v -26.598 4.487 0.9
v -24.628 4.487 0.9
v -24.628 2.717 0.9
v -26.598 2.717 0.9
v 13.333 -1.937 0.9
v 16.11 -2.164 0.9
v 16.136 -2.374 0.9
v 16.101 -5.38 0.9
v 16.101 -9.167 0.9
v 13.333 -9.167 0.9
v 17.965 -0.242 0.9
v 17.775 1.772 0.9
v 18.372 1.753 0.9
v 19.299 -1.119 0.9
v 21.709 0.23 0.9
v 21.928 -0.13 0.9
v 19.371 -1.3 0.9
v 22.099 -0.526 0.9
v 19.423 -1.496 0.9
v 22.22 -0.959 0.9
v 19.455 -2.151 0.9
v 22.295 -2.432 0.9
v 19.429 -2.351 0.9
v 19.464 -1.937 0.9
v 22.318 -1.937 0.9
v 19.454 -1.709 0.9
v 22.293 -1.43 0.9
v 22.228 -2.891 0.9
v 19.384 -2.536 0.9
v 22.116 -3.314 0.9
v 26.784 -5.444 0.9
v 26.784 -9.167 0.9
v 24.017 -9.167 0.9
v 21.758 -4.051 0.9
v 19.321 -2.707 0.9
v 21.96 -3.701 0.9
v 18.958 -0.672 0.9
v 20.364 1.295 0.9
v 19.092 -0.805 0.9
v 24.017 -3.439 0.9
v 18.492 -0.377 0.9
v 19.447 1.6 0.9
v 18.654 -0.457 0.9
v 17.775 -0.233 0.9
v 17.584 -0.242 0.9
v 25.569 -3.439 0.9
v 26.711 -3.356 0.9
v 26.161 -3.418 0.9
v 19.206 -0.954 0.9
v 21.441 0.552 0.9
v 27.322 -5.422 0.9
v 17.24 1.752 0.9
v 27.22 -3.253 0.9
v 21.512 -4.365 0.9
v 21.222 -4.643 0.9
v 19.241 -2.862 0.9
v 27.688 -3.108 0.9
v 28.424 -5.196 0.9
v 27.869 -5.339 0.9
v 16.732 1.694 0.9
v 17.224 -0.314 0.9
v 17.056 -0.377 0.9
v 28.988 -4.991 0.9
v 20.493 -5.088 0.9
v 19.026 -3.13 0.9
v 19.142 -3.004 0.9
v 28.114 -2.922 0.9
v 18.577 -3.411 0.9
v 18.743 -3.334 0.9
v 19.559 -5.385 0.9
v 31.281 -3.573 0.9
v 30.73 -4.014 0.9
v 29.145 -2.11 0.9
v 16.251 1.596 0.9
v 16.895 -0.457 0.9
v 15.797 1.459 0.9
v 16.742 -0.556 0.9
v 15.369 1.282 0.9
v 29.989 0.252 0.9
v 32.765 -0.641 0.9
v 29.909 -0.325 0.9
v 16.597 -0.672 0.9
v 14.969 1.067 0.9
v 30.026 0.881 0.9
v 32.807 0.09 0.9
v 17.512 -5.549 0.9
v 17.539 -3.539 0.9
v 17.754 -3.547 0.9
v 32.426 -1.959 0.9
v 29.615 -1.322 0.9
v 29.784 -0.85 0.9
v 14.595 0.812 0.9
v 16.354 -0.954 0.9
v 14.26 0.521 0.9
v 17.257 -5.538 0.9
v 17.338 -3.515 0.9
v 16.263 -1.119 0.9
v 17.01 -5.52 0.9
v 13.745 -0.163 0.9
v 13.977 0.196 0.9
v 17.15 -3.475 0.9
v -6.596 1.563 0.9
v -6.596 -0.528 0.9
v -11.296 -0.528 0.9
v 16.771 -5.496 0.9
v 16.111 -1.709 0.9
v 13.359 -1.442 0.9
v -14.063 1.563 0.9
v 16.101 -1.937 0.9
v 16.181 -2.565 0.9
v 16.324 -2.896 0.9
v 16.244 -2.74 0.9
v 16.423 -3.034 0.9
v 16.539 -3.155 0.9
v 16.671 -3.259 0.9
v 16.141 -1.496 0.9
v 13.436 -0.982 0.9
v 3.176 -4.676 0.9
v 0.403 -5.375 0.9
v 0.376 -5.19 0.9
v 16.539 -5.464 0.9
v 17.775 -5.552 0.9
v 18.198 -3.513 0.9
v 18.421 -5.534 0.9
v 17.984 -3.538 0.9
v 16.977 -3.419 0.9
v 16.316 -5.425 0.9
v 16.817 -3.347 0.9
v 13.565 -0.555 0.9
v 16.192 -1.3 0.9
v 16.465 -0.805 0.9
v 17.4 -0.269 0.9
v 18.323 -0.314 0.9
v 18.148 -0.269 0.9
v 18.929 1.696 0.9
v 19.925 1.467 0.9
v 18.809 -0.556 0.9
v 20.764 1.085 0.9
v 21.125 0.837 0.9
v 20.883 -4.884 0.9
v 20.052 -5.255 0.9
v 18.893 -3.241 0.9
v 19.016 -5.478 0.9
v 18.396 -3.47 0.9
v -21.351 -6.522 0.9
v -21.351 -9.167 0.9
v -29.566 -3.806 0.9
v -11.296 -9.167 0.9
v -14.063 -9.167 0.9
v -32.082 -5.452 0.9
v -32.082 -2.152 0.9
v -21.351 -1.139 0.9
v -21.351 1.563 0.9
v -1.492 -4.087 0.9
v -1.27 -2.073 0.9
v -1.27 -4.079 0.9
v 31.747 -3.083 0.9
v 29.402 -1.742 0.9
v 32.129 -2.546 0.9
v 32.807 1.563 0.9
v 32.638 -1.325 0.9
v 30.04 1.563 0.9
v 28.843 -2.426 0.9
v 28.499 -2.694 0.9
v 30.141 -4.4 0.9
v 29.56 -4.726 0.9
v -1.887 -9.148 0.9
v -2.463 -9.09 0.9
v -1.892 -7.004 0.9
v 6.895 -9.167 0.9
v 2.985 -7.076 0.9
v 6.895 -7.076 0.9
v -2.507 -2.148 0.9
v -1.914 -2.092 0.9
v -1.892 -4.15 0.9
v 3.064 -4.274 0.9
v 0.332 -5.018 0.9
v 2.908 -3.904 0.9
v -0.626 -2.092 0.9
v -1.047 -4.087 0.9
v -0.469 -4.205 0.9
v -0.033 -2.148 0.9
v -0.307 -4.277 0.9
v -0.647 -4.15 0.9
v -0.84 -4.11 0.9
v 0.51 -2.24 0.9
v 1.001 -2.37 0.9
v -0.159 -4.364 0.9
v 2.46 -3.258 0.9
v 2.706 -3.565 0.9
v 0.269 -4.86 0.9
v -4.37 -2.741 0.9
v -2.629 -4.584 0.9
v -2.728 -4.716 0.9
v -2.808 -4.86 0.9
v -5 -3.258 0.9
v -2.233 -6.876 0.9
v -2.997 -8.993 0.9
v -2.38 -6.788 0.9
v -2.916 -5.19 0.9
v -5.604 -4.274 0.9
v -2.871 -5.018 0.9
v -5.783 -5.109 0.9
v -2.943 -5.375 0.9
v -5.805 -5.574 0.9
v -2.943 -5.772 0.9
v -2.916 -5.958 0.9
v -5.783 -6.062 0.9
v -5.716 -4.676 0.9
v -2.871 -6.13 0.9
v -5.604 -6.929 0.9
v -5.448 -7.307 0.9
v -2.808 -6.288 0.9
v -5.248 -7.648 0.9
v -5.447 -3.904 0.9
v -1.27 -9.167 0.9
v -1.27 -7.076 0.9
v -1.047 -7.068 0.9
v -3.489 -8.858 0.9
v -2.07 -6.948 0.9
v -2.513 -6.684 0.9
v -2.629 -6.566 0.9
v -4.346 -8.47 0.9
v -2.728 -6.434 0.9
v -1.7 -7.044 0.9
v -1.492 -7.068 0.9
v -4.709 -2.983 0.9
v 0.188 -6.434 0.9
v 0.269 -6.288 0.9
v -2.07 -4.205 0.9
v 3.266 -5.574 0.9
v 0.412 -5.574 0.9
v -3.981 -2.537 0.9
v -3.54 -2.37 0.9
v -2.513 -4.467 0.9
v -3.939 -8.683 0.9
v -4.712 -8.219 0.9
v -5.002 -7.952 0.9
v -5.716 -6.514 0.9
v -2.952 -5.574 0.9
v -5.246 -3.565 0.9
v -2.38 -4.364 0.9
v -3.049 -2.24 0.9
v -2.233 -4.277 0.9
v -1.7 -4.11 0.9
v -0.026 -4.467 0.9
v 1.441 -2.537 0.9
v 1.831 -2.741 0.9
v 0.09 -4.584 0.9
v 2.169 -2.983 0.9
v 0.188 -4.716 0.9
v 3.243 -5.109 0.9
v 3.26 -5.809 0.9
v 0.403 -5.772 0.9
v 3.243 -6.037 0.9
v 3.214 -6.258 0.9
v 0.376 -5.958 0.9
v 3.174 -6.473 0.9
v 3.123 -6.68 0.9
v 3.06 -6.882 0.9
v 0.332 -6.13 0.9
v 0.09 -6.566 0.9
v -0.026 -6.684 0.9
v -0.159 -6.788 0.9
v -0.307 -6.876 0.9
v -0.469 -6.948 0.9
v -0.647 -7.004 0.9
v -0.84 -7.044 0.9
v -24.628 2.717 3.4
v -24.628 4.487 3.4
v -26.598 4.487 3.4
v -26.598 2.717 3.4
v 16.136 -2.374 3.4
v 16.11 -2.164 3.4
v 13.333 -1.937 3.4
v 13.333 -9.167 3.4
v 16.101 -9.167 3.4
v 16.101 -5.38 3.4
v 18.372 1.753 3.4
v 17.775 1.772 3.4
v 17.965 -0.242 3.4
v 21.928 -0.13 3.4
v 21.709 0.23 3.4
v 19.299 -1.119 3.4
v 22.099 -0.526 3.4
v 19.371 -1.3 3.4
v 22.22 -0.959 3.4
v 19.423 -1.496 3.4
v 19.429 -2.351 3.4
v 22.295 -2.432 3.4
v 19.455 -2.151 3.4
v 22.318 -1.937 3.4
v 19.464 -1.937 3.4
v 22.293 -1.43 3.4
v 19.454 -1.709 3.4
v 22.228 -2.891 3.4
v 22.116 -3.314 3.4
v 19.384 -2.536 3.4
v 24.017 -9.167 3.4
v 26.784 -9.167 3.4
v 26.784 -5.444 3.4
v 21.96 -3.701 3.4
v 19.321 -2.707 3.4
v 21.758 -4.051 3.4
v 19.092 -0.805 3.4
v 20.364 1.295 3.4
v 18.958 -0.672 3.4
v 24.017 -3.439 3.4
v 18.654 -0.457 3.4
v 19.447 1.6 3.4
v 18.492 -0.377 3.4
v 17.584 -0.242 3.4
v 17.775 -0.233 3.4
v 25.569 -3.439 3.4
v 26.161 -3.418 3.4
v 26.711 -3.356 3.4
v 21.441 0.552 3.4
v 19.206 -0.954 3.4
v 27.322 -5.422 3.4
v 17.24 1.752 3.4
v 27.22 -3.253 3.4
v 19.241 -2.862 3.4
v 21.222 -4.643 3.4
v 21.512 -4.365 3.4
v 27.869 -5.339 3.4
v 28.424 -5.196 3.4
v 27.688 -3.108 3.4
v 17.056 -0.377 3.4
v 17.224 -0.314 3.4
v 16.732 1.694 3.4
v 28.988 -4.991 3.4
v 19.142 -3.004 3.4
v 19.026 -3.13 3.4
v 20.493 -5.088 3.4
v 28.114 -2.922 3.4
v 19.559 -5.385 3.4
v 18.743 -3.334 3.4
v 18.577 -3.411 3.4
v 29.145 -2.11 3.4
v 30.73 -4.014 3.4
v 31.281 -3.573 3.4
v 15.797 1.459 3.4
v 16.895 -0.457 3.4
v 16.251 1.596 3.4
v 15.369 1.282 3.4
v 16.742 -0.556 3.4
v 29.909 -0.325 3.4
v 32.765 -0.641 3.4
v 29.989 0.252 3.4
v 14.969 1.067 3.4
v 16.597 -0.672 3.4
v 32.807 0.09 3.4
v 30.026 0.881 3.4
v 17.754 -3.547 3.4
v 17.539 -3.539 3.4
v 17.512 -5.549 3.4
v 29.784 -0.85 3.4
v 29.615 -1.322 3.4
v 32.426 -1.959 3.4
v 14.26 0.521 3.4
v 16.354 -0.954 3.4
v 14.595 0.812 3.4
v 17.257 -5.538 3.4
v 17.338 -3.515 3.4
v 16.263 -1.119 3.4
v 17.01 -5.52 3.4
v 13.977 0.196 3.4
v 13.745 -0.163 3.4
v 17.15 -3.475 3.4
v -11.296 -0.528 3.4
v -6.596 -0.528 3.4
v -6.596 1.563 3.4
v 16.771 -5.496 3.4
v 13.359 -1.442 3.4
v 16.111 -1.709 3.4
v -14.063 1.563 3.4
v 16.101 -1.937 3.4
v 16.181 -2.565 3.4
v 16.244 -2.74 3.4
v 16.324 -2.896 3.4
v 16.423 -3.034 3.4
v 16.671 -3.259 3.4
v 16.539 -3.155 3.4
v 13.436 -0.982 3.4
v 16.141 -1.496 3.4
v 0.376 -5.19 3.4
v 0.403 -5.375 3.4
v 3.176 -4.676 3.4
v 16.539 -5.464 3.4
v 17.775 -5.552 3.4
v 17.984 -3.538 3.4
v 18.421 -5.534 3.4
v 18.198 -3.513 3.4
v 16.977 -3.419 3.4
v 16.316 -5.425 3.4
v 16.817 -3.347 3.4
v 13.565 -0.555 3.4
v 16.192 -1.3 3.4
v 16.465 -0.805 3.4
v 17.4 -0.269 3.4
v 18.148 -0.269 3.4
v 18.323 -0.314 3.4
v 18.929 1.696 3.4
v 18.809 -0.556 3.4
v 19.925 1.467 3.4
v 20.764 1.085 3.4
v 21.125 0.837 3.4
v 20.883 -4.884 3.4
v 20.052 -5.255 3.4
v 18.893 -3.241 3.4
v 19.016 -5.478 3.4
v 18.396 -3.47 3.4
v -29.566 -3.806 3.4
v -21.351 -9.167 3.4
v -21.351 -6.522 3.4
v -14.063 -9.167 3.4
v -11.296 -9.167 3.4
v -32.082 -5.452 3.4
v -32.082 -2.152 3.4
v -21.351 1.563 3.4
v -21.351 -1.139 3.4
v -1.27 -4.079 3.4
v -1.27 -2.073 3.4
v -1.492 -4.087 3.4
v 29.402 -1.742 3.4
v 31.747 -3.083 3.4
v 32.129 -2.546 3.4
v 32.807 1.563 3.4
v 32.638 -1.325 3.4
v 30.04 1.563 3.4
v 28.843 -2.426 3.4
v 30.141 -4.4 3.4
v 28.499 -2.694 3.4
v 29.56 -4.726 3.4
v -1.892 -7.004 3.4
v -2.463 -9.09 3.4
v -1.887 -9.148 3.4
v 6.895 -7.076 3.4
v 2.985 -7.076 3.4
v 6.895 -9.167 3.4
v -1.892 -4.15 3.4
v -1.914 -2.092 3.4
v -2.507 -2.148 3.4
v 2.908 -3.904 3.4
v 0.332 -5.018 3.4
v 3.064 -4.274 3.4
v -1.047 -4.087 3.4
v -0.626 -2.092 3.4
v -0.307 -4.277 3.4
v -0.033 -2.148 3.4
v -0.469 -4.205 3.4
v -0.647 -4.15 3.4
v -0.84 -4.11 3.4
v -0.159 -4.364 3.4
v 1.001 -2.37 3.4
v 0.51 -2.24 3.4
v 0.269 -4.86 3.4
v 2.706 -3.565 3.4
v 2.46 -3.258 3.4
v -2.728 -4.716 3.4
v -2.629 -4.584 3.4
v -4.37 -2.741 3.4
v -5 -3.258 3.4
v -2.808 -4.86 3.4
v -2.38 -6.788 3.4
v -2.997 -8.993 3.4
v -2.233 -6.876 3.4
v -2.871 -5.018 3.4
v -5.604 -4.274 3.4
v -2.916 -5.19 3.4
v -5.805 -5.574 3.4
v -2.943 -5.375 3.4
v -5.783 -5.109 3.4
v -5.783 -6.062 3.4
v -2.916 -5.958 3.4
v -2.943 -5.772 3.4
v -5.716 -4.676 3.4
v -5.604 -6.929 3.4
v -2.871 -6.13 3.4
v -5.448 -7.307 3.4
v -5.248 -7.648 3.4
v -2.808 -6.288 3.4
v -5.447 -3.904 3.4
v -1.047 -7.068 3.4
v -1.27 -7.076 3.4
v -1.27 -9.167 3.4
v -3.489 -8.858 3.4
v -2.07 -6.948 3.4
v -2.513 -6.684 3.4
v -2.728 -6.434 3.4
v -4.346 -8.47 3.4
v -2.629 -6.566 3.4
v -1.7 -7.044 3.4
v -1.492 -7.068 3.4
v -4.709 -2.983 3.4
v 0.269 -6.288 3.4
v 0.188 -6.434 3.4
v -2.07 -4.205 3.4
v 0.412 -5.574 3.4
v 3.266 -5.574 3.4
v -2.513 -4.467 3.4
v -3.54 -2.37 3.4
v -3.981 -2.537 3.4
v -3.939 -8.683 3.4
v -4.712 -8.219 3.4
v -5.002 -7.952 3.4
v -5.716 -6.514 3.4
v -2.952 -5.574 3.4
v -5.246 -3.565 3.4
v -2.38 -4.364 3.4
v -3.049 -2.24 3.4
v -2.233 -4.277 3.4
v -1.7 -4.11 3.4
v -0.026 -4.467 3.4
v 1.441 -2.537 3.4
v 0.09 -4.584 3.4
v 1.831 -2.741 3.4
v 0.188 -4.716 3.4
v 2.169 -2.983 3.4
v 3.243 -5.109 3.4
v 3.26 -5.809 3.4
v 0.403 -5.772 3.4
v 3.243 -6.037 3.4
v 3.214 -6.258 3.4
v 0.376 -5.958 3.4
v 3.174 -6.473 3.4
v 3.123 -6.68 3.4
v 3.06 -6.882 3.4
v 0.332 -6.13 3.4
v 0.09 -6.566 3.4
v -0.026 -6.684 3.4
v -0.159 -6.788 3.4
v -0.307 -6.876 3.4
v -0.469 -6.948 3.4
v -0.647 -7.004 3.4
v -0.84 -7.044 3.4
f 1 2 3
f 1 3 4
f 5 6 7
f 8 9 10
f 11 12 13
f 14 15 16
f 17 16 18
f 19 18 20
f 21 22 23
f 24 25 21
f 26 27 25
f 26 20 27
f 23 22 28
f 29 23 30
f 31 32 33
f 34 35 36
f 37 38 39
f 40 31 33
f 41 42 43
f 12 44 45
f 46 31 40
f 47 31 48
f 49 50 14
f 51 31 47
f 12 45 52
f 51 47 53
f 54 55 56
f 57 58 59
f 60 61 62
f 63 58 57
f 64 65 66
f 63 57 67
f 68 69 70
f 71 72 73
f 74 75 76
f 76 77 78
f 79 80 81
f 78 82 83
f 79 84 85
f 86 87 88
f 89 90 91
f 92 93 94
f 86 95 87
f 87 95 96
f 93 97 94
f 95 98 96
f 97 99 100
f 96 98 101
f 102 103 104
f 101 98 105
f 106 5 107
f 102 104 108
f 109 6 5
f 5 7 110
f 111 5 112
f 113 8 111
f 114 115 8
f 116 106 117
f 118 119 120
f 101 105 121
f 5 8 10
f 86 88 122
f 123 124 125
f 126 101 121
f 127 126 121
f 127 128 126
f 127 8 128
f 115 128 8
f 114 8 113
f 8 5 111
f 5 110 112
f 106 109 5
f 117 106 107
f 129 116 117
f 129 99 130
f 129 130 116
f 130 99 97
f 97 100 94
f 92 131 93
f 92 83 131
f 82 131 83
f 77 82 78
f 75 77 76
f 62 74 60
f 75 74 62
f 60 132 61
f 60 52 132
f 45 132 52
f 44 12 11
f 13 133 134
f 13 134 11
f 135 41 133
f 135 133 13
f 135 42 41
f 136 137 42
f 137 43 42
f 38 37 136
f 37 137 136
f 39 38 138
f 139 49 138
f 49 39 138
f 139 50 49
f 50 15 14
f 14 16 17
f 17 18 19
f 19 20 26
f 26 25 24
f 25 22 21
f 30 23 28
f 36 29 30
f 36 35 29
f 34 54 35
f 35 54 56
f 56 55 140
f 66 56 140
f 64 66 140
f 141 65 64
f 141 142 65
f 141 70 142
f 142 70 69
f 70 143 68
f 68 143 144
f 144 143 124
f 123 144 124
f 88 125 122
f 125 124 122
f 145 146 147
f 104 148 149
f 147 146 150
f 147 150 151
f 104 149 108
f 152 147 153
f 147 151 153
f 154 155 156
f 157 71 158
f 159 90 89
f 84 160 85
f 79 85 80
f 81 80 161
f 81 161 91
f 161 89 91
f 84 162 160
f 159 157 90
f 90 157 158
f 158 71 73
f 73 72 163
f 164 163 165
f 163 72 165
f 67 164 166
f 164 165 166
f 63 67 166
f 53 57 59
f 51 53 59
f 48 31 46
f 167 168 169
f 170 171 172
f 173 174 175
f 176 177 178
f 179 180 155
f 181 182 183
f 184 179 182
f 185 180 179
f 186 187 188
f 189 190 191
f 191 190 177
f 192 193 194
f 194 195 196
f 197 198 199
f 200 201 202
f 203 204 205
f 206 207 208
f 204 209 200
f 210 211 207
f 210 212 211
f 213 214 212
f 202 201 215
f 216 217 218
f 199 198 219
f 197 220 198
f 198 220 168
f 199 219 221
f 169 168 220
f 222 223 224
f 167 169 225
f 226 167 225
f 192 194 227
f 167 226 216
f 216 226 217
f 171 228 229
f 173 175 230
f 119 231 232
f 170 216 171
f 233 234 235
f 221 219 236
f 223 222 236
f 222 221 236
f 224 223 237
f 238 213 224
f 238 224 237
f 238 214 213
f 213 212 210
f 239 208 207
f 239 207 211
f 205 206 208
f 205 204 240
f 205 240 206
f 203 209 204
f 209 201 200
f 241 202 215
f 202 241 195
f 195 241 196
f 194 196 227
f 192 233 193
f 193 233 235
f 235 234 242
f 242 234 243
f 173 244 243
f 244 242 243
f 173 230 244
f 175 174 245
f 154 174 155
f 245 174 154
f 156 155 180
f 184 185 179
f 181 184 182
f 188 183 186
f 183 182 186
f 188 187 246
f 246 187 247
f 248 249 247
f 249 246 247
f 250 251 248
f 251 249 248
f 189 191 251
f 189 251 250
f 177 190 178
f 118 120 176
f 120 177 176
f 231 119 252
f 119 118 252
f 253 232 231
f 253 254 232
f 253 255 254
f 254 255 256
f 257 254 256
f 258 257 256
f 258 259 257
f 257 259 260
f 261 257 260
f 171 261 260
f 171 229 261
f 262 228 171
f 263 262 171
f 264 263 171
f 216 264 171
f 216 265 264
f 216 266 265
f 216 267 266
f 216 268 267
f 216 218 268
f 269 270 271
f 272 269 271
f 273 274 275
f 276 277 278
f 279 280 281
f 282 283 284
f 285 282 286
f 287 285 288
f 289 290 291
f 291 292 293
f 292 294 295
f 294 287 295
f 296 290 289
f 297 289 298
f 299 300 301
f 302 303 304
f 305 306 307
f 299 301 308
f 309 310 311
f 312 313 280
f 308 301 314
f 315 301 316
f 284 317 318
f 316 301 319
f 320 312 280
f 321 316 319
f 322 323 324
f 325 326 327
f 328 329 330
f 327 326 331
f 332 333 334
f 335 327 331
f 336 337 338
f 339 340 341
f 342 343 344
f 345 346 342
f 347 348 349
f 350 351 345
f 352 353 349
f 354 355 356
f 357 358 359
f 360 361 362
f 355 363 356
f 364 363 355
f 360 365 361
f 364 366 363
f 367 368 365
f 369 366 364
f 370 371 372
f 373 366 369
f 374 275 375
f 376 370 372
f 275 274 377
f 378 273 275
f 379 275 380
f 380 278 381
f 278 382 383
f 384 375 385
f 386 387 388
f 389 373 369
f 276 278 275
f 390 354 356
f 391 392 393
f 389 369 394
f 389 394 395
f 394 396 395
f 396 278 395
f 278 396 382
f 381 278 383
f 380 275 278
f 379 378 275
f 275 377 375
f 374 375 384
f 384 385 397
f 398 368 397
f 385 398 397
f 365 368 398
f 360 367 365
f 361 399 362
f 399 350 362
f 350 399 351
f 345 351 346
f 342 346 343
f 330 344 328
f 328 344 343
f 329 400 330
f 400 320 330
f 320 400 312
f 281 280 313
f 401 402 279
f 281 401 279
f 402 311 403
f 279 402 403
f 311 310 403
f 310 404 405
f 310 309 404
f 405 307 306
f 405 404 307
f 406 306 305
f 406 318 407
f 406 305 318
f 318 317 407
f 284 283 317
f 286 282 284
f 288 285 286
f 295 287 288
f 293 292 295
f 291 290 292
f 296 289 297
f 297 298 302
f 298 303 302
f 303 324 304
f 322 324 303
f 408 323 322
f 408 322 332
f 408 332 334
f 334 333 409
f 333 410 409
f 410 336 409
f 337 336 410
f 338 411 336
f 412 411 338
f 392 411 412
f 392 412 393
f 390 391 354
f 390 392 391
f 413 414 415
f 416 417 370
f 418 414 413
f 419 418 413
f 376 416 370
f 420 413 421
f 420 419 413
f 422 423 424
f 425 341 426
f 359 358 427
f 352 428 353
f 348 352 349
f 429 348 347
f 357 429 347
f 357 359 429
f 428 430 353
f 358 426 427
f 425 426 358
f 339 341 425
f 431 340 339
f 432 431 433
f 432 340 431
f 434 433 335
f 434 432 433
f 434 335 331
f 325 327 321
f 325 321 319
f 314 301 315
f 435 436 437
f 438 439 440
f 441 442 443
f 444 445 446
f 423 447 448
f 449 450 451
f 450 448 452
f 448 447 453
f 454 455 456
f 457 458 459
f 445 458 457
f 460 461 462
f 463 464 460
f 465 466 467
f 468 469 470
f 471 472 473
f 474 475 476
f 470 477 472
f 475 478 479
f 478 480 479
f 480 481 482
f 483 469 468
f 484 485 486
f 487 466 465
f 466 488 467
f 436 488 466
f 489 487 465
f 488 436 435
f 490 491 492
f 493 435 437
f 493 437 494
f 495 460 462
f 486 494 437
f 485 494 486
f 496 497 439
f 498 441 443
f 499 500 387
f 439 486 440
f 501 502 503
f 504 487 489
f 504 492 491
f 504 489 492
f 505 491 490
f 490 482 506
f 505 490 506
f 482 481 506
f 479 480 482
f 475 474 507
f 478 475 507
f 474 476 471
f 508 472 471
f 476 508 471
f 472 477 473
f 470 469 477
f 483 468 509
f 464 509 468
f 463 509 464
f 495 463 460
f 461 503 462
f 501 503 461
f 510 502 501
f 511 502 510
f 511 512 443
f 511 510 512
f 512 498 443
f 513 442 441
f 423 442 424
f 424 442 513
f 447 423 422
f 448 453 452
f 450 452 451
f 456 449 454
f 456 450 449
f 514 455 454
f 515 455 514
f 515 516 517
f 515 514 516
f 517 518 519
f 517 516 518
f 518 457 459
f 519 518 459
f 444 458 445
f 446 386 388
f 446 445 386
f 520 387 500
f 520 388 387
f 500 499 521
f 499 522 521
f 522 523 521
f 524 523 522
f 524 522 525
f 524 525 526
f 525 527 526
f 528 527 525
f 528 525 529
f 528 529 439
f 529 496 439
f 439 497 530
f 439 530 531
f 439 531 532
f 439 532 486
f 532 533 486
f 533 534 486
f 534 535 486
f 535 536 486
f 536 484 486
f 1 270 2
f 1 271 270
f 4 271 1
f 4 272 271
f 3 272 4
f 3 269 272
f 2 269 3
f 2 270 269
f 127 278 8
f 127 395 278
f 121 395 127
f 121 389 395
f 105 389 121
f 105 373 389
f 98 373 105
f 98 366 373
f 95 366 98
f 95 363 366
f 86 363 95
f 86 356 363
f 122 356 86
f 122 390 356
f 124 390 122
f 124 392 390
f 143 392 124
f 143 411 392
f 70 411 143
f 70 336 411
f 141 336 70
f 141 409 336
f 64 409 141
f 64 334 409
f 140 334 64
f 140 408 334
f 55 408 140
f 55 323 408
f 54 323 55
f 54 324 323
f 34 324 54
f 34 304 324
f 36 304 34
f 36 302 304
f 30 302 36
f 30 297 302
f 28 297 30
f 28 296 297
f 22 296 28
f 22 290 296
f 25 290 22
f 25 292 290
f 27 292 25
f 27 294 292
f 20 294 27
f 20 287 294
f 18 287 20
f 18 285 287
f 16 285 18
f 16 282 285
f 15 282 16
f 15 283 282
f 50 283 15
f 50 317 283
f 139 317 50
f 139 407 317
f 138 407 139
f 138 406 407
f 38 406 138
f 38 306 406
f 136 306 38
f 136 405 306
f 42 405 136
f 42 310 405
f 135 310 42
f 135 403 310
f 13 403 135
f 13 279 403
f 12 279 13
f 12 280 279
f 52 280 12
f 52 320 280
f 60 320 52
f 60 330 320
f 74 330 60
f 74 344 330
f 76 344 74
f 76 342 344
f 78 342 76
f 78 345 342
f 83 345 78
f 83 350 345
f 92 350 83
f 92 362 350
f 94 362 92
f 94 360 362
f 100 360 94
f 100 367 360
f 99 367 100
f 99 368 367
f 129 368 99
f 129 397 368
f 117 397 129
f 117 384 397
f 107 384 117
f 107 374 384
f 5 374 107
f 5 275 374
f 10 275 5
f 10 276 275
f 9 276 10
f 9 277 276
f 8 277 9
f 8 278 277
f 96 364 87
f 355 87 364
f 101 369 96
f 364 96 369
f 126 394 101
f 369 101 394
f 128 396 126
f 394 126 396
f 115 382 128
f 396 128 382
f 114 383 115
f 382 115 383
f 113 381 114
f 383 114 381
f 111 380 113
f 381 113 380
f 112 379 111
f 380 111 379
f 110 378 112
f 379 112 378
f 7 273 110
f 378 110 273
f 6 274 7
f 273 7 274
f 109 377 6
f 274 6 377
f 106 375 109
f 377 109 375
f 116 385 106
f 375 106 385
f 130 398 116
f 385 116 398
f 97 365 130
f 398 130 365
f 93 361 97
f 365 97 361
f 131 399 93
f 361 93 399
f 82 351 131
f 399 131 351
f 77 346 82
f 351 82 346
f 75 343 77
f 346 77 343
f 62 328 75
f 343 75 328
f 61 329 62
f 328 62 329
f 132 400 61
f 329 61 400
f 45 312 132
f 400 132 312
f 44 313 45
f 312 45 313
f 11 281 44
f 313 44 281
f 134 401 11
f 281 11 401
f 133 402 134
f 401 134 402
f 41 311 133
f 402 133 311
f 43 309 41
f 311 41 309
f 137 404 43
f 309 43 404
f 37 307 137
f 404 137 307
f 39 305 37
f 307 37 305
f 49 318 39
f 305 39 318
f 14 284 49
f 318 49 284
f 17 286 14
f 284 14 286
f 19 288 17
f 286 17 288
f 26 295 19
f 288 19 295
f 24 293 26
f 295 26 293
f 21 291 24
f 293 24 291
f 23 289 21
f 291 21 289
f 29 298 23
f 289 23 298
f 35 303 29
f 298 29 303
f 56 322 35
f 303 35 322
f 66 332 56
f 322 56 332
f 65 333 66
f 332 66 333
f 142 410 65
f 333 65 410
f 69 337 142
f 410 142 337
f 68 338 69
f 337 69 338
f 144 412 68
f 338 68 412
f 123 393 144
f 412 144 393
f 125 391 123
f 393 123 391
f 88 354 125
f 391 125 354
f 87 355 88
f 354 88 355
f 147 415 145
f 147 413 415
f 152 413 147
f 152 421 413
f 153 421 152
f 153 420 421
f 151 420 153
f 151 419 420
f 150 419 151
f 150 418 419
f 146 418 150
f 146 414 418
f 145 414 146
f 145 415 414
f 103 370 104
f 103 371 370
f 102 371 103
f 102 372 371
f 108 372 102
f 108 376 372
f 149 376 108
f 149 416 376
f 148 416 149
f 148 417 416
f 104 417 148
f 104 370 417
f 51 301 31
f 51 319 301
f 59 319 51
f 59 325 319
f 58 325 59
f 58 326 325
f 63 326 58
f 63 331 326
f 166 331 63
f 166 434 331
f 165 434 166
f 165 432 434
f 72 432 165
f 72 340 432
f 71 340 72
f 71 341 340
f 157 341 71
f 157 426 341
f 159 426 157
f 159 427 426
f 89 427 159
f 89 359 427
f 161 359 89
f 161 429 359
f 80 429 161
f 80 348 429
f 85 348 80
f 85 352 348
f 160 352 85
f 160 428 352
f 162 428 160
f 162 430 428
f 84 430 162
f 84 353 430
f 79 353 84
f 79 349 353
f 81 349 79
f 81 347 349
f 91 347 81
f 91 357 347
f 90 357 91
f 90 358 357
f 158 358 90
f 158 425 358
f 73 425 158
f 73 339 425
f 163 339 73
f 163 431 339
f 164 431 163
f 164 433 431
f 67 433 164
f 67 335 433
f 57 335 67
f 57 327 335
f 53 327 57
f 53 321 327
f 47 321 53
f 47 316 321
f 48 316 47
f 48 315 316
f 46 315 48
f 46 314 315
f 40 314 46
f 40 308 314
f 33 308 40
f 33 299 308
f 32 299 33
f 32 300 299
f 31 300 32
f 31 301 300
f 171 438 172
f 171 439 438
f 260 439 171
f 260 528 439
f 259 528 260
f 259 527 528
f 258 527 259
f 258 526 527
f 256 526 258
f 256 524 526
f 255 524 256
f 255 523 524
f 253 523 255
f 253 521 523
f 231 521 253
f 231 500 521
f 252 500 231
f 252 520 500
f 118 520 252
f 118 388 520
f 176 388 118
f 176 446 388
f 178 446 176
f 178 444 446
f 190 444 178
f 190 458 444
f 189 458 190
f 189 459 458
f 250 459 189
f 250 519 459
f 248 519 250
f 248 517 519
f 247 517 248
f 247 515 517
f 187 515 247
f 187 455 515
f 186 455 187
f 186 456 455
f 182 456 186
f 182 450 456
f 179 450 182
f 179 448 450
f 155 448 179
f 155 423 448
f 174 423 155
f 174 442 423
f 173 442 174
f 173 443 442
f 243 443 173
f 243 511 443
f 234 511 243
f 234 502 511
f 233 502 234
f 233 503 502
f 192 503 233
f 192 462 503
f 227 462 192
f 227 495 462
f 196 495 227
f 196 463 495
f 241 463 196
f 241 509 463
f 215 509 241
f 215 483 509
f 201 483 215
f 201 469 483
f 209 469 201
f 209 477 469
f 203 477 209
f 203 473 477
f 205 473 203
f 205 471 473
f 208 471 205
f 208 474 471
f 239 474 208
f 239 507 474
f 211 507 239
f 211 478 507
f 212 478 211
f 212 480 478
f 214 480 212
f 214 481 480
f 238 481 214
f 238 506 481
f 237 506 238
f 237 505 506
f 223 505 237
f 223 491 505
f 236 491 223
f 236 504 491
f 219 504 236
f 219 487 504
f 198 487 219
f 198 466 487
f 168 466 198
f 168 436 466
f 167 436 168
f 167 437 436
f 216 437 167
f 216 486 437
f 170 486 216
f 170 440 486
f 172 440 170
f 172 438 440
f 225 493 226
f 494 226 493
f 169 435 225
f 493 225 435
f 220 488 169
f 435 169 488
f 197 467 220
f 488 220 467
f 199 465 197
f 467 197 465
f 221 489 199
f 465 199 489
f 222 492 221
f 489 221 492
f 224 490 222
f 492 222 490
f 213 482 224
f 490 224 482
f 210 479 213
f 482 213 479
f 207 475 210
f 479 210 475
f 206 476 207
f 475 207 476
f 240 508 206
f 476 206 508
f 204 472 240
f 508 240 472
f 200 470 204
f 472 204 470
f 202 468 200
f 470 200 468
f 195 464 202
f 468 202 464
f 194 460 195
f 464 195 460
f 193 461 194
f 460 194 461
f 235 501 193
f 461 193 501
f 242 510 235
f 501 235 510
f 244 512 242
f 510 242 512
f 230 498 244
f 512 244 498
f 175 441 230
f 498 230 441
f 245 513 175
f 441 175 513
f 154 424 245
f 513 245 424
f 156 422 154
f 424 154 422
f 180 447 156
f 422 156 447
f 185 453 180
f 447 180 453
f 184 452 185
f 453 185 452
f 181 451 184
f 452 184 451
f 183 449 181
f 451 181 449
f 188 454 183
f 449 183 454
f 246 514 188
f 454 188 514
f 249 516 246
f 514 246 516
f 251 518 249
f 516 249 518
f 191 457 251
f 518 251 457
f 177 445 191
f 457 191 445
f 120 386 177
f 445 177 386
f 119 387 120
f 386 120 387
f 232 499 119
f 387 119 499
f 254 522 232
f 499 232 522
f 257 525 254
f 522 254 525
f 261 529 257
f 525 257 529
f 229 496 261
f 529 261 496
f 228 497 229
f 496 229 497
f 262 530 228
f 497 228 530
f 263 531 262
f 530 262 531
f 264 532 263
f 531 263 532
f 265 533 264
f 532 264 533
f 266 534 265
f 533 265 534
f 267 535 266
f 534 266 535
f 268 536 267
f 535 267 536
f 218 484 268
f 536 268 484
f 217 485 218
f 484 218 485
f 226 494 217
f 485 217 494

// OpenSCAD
$fn = 48;
  // syllabics (overlaid on icon, tallest)
  translate([0, -2.500, 0.900]) linear_extrude(height=2.500) text("ᐹ ᒥᓇ ᑭᓯ", size=10.599, halign="center", valign="center", font="Euphemia UCAS:style=Bold");
